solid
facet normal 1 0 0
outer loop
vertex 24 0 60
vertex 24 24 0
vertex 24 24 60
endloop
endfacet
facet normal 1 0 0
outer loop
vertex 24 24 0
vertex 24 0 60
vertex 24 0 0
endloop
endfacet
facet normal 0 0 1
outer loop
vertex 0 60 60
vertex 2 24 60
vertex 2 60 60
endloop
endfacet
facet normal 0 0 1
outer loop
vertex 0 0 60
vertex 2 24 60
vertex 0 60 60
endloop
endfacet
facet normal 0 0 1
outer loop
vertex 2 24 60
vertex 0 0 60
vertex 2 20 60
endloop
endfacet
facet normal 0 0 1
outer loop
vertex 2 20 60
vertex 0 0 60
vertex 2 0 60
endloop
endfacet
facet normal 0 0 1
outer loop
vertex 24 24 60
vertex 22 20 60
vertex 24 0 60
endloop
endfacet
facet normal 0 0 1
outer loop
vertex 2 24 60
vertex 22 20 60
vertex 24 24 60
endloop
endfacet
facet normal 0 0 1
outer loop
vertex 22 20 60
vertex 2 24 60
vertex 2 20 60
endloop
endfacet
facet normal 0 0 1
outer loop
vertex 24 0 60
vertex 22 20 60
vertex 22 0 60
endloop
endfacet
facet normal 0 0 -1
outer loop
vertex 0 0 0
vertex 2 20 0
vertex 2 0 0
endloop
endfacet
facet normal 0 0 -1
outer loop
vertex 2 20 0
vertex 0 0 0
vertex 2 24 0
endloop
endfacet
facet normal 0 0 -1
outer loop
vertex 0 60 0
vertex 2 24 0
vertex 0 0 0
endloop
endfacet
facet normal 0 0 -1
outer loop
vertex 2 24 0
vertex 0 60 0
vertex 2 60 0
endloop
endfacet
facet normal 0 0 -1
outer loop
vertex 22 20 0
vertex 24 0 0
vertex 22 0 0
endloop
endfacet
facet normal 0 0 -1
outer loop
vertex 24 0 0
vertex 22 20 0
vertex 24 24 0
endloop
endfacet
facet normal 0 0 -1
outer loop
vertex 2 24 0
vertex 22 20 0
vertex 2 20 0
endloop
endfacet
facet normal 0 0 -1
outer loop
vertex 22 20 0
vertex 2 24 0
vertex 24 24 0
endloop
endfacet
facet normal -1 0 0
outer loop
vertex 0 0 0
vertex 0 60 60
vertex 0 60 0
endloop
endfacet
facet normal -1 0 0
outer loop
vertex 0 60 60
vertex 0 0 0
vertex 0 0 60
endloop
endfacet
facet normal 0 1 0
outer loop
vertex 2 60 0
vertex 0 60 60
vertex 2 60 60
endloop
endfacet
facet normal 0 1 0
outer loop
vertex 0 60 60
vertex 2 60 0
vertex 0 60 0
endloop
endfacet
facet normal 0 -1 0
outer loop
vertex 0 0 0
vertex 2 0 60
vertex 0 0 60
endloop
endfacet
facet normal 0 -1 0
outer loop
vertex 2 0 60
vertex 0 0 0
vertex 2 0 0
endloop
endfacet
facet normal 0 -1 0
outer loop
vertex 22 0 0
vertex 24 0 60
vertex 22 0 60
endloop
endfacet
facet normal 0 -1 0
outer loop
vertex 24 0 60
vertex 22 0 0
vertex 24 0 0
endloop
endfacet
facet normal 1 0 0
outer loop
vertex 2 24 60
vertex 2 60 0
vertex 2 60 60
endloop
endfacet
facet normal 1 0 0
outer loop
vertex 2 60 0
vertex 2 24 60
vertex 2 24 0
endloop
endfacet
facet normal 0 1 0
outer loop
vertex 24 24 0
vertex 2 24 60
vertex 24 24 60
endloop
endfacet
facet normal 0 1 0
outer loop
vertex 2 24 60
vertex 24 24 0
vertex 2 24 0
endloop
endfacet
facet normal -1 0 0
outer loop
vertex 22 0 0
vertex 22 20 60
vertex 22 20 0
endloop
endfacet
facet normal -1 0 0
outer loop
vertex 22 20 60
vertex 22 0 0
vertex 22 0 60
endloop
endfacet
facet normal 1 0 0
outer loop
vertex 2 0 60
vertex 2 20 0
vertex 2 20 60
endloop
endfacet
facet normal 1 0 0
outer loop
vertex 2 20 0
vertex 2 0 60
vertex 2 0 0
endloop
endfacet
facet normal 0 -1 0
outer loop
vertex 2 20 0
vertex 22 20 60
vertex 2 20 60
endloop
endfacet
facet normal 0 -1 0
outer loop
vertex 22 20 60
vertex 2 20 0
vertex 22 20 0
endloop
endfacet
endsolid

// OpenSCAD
shape_max = [24, 60, 60];
shape_min = [0, 0, 0];
shape_for_difference = [shape_max[0] + 10, shape_max[1] + 10, shape_max[2] + 10];

difference() {
    cube(shape_max);
    translate([2, 24, -5]) {
        cube(shape_for_difference);
    }
    translate([2, -shape_max[1]+20, -5]) {
        cube([20, shape_max[1], shape_for_difference[2]]);
    }
}
